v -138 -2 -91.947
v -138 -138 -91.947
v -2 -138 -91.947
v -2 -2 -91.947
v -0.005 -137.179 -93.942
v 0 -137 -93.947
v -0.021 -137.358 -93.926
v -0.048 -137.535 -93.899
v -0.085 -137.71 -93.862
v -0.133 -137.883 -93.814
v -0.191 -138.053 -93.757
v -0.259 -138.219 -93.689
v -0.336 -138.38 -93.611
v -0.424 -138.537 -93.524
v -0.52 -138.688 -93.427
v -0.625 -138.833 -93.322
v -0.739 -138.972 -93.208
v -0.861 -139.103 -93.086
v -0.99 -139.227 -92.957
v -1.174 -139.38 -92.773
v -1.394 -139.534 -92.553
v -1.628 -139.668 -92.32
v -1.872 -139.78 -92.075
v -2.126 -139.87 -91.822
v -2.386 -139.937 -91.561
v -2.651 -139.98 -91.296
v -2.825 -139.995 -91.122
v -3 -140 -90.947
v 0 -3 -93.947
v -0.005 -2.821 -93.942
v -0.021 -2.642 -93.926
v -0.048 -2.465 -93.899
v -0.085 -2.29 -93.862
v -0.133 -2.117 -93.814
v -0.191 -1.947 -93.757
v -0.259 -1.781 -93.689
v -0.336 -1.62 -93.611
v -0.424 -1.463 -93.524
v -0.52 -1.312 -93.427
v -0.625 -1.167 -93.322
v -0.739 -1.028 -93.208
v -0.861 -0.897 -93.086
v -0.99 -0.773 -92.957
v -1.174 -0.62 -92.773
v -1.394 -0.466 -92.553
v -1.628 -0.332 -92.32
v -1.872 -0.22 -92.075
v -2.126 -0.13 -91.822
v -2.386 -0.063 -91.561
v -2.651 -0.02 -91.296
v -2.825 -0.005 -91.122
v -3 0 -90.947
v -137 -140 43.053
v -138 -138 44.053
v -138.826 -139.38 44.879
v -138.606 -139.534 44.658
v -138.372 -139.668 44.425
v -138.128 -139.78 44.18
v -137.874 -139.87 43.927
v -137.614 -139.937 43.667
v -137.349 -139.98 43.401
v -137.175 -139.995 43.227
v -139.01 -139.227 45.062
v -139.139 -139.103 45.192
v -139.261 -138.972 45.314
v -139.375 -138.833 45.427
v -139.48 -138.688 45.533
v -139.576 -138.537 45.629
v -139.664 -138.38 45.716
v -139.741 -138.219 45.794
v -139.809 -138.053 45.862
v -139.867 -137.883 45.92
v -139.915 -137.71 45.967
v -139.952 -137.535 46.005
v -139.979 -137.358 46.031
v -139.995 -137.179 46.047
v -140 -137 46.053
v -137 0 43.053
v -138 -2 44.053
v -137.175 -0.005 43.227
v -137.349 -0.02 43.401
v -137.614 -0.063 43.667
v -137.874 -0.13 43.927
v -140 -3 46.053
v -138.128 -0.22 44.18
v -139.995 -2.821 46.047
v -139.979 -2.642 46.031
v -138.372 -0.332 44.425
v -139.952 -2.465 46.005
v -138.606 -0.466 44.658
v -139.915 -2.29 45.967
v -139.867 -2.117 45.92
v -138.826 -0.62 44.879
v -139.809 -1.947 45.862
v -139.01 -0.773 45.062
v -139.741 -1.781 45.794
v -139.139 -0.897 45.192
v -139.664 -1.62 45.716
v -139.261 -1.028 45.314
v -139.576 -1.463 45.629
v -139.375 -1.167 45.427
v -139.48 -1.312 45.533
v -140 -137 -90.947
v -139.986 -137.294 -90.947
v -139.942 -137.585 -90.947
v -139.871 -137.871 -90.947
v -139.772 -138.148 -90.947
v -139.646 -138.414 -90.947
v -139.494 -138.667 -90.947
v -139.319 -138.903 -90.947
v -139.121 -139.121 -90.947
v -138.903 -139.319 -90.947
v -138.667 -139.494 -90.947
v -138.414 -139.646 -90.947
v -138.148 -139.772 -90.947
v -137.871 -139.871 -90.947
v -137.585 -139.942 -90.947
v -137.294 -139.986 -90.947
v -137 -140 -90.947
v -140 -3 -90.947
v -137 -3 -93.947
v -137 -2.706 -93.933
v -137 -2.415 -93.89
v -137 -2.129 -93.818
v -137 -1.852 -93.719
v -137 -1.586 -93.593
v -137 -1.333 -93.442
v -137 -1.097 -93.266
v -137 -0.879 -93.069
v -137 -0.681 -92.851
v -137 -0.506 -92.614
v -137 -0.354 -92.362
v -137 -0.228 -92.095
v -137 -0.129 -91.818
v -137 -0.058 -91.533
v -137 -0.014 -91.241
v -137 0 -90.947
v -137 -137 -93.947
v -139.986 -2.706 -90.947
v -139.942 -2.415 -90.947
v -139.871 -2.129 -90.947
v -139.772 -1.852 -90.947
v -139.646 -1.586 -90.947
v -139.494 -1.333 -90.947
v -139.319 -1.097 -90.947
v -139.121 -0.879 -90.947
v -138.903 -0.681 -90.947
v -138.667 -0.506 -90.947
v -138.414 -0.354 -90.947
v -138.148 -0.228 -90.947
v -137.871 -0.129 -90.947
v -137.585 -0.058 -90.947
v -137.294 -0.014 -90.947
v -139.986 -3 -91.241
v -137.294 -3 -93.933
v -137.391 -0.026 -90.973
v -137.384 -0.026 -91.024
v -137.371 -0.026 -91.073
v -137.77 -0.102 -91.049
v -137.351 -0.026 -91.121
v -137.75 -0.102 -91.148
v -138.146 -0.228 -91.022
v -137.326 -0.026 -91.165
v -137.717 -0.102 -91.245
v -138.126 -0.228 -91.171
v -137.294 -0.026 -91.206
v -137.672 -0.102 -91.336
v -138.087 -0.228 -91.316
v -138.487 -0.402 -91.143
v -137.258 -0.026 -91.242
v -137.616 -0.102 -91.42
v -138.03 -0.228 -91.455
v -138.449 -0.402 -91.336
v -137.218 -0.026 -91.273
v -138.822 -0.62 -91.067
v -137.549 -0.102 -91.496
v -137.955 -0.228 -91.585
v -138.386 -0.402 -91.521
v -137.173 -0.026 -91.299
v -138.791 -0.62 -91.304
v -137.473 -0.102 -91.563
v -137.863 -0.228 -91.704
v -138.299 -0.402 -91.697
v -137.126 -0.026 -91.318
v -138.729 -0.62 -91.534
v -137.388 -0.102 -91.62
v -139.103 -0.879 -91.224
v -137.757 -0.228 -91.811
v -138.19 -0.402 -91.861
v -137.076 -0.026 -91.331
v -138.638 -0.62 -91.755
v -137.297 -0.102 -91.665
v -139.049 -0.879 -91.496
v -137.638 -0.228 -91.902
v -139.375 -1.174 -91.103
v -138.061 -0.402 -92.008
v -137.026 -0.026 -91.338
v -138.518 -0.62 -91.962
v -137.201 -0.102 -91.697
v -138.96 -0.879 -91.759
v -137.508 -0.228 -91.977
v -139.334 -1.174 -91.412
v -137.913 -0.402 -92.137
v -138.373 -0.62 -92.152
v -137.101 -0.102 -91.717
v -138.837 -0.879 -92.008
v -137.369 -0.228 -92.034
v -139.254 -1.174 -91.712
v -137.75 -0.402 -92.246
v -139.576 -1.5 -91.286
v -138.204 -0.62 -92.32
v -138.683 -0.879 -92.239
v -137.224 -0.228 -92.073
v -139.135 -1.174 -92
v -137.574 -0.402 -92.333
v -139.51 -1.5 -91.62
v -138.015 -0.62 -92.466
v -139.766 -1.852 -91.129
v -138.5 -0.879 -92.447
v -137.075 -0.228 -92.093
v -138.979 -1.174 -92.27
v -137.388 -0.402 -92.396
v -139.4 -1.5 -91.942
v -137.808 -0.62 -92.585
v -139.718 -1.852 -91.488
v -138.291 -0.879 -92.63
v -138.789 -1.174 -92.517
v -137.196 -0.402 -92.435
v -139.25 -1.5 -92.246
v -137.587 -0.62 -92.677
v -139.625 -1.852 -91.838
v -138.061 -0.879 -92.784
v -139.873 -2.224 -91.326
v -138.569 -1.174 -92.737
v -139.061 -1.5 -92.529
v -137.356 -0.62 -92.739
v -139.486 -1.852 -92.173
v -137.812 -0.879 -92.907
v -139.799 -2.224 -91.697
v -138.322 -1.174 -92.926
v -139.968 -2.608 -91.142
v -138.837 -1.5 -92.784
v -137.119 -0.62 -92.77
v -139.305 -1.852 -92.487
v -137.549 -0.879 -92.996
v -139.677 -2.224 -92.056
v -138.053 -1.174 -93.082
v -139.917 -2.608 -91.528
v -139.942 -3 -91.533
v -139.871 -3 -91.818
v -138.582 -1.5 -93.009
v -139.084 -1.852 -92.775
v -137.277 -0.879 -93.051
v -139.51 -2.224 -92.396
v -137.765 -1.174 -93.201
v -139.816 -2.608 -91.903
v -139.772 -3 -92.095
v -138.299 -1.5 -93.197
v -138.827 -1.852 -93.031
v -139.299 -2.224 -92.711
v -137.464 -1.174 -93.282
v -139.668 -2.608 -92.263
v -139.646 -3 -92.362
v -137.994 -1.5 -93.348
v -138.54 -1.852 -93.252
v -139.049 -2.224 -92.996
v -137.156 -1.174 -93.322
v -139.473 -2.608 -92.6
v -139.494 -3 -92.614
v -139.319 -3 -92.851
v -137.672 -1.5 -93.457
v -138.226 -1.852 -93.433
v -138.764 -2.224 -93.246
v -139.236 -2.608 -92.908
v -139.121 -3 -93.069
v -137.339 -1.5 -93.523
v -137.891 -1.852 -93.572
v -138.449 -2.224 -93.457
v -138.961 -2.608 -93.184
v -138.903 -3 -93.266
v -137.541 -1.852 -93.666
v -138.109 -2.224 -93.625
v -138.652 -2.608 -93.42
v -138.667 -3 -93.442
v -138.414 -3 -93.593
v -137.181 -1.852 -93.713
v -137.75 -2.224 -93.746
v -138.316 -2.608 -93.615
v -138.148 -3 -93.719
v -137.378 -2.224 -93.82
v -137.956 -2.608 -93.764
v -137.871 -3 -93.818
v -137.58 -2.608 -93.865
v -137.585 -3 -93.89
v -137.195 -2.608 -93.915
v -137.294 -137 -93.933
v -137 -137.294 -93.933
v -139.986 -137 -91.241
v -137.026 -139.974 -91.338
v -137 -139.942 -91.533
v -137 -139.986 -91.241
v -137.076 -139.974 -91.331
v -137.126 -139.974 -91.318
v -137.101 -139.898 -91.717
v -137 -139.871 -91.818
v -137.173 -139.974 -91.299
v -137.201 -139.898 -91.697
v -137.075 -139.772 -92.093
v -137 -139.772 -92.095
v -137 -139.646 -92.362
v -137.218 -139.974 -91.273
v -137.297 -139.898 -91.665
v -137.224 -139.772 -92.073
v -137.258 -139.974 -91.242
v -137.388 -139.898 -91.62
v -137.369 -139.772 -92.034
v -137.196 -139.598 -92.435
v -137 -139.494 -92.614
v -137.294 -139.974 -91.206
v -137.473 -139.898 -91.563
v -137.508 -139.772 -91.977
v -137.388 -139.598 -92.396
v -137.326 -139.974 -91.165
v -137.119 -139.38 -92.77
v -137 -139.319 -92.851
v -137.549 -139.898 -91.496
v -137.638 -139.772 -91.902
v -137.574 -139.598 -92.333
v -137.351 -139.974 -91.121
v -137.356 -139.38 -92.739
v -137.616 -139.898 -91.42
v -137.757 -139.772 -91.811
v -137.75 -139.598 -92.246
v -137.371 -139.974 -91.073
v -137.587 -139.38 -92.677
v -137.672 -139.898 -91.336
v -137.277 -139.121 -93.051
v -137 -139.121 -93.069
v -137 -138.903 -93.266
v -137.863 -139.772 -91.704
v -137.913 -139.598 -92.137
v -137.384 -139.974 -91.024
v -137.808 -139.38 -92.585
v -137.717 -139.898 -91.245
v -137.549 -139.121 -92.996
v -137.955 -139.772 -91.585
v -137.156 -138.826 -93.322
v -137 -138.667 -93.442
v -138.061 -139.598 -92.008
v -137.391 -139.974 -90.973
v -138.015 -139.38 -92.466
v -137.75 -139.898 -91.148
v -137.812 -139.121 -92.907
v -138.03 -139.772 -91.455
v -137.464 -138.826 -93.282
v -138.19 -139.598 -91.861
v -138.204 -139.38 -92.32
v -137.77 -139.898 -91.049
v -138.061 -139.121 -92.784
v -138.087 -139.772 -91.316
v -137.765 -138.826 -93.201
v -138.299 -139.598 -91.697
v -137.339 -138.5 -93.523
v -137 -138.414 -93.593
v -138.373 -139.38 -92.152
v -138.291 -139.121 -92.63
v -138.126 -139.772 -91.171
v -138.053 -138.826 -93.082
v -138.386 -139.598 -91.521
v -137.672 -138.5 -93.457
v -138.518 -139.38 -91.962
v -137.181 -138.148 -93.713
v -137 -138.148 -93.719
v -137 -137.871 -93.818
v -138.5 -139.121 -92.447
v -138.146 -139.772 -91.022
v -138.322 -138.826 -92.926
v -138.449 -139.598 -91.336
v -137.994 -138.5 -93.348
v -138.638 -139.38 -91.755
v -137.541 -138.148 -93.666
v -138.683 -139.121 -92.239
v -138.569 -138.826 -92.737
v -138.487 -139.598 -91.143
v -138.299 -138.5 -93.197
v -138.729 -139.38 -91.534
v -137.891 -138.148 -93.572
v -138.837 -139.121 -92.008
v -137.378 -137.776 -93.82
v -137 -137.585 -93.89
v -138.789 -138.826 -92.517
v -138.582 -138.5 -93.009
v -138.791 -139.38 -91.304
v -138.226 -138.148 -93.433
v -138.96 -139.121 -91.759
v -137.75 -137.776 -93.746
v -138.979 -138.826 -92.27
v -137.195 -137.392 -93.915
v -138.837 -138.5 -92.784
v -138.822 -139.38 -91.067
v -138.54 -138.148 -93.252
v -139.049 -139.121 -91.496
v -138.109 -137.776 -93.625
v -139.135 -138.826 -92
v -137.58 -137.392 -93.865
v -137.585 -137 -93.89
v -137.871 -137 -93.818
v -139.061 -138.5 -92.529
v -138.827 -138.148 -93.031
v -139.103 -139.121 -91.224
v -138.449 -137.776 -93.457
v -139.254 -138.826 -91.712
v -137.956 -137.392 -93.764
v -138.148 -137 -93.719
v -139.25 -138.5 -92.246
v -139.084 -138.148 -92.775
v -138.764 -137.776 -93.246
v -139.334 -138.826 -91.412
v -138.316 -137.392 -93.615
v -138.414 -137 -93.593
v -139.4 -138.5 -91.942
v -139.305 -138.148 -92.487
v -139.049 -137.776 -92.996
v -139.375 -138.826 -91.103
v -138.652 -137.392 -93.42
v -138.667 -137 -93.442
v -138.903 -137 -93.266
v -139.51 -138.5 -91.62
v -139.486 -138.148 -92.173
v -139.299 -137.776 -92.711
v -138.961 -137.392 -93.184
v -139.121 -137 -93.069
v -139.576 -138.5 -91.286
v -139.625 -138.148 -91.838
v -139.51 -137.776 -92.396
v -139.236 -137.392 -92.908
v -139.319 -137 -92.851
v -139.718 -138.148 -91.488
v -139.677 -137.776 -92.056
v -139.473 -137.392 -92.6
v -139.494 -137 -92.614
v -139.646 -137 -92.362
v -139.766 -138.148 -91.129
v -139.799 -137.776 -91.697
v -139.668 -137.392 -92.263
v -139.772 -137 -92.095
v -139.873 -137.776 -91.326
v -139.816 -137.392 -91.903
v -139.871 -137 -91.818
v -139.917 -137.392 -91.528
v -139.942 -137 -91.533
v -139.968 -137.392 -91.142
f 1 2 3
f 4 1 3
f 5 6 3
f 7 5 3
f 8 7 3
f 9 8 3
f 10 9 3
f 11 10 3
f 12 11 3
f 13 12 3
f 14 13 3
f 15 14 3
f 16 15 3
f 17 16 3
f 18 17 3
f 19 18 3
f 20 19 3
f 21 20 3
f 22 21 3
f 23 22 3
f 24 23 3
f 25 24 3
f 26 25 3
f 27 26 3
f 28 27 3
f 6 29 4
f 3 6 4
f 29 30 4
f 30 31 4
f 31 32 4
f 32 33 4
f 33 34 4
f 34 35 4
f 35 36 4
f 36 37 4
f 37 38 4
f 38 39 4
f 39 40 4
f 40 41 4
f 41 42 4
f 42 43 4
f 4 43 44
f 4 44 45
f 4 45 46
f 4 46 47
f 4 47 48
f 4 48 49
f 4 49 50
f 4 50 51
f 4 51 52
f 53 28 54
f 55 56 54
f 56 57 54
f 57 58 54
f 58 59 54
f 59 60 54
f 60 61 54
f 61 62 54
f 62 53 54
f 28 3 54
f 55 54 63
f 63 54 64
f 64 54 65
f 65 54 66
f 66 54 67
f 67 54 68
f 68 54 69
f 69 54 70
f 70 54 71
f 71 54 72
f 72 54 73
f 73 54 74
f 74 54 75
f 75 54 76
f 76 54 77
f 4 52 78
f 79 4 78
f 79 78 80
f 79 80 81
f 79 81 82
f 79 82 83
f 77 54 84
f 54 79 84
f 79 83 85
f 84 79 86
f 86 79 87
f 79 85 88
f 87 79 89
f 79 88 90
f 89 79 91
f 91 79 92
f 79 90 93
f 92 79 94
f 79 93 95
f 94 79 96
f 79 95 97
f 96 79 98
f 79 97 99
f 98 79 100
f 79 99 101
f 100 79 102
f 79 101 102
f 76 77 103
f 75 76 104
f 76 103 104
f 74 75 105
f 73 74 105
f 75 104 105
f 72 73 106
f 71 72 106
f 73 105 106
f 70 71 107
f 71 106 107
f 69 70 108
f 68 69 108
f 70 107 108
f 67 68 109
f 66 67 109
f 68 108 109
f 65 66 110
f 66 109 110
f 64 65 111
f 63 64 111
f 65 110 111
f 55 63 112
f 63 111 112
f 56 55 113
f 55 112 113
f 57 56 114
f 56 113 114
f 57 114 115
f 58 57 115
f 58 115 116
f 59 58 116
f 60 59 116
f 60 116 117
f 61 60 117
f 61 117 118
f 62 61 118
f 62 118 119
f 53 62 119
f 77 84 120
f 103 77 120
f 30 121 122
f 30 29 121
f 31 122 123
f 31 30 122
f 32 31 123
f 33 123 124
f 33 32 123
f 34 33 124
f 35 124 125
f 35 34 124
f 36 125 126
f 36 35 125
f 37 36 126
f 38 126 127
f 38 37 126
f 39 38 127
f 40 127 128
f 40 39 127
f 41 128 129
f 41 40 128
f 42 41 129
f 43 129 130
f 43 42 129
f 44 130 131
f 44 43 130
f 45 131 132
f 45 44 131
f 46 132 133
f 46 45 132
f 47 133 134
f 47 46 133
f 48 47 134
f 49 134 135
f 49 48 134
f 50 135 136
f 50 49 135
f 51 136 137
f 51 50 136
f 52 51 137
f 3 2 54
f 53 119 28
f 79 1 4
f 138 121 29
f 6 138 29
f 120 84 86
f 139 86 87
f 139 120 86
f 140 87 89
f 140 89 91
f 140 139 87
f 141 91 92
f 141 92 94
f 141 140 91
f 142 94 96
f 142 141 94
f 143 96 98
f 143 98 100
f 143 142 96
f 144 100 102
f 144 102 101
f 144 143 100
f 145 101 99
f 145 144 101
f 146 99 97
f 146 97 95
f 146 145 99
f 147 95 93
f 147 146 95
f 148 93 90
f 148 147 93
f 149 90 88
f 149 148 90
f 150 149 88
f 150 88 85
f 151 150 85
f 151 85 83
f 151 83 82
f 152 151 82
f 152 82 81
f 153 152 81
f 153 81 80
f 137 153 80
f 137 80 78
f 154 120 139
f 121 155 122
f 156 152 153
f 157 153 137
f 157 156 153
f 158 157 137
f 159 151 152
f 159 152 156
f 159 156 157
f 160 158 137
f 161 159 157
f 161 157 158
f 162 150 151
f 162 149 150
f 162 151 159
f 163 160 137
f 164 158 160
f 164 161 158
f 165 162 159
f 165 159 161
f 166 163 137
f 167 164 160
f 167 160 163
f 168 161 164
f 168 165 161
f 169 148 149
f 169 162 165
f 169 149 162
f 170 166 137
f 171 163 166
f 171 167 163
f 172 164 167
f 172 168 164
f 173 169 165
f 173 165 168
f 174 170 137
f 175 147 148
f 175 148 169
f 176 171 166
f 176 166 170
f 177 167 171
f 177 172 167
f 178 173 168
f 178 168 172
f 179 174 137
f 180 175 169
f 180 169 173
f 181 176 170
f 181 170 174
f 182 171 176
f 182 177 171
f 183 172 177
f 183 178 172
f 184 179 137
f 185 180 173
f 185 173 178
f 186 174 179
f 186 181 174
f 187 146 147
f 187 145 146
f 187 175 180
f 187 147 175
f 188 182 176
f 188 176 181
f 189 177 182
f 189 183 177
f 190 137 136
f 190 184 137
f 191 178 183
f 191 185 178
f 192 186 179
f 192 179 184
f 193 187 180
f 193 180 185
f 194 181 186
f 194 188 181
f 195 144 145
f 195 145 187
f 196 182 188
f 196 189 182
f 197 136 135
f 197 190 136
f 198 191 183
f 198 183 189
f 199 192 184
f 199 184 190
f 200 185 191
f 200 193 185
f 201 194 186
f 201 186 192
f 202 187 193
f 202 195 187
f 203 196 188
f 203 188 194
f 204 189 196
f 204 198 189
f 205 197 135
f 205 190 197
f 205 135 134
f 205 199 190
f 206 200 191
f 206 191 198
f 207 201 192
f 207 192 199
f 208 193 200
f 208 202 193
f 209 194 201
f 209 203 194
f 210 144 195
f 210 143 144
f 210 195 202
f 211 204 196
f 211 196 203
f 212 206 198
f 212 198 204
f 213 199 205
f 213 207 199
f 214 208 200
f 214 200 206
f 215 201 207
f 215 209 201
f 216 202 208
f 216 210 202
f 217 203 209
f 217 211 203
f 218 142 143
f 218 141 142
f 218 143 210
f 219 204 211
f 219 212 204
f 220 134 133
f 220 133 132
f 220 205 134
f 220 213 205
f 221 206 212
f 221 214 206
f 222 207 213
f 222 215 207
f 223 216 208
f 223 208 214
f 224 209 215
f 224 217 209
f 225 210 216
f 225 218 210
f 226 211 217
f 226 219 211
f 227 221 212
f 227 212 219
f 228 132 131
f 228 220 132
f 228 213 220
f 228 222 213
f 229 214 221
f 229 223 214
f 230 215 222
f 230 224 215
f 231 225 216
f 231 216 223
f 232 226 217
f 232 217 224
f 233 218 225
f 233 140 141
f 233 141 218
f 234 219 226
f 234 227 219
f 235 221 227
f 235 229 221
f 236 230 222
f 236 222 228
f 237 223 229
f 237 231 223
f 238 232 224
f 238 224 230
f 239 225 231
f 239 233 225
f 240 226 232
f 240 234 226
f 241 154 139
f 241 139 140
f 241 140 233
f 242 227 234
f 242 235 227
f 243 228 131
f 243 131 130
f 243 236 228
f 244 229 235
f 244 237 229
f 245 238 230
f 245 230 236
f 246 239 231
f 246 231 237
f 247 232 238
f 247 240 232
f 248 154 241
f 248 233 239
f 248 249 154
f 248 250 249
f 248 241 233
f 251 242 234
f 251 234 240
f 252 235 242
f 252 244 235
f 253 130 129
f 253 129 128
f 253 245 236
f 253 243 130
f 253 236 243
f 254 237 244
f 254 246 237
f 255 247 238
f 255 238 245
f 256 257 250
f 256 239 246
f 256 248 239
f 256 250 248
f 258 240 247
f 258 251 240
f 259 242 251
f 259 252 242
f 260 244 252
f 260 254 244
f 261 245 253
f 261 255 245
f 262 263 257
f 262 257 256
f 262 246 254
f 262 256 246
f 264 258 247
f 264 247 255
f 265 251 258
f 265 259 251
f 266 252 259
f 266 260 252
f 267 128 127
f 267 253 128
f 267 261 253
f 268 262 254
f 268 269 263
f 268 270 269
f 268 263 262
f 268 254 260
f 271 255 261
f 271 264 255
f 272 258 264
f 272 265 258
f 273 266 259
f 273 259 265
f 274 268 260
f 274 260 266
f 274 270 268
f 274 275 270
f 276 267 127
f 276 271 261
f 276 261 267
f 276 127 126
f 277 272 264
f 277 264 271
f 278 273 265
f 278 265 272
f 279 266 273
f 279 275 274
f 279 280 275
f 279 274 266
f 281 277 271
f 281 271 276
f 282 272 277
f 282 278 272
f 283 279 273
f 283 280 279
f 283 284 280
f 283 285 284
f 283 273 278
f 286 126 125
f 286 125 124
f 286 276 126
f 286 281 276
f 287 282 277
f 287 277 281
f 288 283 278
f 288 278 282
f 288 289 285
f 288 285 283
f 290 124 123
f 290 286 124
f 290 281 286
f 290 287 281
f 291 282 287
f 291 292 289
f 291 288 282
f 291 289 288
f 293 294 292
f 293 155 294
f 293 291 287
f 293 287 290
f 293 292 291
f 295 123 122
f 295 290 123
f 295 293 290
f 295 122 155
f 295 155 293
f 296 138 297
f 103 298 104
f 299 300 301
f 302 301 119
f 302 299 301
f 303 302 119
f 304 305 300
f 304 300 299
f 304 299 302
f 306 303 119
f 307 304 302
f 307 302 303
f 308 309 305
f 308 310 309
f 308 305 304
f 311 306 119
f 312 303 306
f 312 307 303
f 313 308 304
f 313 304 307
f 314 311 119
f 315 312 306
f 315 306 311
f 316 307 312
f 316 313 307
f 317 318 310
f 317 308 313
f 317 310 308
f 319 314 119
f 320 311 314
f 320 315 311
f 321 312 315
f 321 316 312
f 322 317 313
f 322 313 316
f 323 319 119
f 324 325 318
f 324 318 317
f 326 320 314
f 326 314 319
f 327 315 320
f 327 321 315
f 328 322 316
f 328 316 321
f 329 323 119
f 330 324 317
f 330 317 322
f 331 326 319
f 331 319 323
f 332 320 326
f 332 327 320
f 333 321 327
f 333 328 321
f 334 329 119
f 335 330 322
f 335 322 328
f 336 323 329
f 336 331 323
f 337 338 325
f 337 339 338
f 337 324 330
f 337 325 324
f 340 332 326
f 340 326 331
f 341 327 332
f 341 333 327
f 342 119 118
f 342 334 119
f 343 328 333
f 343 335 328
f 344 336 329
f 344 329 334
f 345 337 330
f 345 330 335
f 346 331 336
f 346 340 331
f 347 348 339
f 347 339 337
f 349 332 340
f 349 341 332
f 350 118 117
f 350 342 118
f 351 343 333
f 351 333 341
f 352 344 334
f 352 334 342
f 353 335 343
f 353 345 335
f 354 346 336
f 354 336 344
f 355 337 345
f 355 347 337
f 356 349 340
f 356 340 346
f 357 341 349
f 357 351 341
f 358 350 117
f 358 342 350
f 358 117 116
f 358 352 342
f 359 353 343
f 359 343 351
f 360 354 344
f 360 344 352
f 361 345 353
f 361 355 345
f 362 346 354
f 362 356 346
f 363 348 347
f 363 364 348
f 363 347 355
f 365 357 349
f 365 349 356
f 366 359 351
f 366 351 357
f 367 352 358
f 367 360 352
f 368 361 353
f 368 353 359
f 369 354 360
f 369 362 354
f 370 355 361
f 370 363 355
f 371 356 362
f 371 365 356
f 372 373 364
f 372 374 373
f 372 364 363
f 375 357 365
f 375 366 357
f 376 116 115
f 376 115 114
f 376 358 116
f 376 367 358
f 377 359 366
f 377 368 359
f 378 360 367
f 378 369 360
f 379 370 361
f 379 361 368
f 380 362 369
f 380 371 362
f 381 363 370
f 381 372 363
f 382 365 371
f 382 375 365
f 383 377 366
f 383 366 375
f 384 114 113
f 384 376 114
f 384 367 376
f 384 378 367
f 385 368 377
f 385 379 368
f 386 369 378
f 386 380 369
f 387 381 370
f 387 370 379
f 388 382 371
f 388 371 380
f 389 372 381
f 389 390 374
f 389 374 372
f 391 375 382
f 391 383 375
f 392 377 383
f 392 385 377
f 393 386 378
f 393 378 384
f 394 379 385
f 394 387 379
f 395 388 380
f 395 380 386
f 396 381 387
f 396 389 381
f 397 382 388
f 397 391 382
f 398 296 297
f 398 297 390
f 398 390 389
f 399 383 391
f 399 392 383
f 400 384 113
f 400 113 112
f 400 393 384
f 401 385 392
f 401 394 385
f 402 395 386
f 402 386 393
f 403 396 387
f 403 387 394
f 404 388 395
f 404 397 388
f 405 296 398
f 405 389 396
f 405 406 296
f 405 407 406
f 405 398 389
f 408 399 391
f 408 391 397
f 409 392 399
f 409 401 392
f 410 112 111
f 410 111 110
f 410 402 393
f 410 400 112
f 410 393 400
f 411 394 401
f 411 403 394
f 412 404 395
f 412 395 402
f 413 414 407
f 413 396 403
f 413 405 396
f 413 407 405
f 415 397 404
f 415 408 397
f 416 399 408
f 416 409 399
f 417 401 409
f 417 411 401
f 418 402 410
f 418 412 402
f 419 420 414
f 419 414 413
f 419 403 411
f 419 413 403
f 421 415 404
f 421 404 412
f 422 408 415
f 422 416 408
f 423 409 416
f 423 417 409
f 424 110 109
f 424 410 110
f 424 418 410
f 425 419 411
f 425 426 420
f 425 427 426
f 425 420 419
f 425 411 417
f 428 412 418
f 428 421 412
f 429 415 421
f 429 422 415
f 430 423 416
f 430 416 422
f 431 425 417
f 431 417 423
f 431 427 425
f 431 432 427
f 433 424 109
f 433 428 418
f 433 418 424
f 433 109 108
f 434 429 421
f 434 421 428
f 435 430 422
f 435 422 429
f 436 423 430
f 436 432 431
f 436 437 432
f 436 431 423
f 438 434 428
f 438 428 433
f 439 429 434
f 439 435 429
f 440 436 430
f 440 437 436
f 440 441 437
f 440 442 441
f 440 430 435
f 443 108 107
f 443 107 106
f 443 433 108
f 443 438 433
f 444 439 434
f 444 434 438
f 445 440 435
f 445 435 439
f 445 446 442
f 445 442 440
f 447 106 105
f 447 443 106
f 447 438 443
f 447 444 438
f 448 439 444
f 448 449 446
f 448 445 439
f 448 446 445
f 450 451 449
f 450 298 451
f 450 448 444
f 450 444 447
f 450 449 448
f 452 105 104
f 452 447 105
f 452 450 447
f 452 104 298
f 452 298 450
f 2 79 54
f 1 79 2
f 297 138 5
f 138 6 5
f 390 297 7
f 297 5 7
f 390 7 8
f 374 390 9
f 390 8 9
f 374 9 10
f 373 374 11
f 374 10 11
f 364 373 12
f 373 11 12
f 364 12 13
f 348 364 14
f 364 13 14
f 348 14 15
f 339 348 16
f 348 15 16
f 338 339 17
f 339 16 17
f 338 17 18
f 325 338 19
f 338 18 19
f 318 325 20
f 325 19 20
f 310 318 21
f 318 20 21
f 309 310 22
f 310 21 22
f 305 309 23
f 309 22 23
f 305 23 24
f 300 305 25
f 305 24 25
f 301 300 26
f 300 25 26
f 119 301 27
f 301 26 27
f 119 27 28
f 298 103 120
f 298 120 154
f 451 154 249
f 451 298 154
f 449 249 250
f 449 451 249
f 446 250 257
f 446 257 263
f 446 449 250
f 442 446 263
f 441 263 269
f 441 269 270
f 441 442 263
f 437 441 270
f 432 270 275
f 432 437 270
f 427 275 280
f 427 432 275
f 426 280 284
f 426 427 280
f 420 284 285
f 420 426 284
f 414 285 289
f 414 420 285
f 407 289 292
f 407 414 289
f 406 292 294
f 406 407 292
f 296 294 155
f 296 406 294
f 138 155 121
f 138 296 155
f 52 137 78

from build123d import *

# Parameters (mm, degrees)
F1_DEPTH = 140
F2_T     = -2
F3_R     = 3


with BuildPart() as f1:
    # F0 (on Front) → F1 (new body)
    with BuildSketch(Plane.XZ):
        Polygon((0, -93.947366), (-140, 46.052634), (-140, -93.947366), align=None)
    extrude(amount=F1_DEPTH)

    # F2
    f2_openings = [f1.faces().sort_by_distance(p)[0] for p in [
        (-70, -70, -23.947366),
    ]]
    offset(amount=F2_T, openings=f2_openings)

    # F3
    f3_edges = [f1.edges().sort_by_distance(p)[0] for p in [
        (-140, -70, -93.947366),
        (-140, 0, -23.947366),
        (-70, 0, -93.947366),
        (-70, -140, -93.947366),
        (-140, -140, -23.947366),
    ]]
    fillet(f3_edges, radius=F3_R)


solid = f1.part
